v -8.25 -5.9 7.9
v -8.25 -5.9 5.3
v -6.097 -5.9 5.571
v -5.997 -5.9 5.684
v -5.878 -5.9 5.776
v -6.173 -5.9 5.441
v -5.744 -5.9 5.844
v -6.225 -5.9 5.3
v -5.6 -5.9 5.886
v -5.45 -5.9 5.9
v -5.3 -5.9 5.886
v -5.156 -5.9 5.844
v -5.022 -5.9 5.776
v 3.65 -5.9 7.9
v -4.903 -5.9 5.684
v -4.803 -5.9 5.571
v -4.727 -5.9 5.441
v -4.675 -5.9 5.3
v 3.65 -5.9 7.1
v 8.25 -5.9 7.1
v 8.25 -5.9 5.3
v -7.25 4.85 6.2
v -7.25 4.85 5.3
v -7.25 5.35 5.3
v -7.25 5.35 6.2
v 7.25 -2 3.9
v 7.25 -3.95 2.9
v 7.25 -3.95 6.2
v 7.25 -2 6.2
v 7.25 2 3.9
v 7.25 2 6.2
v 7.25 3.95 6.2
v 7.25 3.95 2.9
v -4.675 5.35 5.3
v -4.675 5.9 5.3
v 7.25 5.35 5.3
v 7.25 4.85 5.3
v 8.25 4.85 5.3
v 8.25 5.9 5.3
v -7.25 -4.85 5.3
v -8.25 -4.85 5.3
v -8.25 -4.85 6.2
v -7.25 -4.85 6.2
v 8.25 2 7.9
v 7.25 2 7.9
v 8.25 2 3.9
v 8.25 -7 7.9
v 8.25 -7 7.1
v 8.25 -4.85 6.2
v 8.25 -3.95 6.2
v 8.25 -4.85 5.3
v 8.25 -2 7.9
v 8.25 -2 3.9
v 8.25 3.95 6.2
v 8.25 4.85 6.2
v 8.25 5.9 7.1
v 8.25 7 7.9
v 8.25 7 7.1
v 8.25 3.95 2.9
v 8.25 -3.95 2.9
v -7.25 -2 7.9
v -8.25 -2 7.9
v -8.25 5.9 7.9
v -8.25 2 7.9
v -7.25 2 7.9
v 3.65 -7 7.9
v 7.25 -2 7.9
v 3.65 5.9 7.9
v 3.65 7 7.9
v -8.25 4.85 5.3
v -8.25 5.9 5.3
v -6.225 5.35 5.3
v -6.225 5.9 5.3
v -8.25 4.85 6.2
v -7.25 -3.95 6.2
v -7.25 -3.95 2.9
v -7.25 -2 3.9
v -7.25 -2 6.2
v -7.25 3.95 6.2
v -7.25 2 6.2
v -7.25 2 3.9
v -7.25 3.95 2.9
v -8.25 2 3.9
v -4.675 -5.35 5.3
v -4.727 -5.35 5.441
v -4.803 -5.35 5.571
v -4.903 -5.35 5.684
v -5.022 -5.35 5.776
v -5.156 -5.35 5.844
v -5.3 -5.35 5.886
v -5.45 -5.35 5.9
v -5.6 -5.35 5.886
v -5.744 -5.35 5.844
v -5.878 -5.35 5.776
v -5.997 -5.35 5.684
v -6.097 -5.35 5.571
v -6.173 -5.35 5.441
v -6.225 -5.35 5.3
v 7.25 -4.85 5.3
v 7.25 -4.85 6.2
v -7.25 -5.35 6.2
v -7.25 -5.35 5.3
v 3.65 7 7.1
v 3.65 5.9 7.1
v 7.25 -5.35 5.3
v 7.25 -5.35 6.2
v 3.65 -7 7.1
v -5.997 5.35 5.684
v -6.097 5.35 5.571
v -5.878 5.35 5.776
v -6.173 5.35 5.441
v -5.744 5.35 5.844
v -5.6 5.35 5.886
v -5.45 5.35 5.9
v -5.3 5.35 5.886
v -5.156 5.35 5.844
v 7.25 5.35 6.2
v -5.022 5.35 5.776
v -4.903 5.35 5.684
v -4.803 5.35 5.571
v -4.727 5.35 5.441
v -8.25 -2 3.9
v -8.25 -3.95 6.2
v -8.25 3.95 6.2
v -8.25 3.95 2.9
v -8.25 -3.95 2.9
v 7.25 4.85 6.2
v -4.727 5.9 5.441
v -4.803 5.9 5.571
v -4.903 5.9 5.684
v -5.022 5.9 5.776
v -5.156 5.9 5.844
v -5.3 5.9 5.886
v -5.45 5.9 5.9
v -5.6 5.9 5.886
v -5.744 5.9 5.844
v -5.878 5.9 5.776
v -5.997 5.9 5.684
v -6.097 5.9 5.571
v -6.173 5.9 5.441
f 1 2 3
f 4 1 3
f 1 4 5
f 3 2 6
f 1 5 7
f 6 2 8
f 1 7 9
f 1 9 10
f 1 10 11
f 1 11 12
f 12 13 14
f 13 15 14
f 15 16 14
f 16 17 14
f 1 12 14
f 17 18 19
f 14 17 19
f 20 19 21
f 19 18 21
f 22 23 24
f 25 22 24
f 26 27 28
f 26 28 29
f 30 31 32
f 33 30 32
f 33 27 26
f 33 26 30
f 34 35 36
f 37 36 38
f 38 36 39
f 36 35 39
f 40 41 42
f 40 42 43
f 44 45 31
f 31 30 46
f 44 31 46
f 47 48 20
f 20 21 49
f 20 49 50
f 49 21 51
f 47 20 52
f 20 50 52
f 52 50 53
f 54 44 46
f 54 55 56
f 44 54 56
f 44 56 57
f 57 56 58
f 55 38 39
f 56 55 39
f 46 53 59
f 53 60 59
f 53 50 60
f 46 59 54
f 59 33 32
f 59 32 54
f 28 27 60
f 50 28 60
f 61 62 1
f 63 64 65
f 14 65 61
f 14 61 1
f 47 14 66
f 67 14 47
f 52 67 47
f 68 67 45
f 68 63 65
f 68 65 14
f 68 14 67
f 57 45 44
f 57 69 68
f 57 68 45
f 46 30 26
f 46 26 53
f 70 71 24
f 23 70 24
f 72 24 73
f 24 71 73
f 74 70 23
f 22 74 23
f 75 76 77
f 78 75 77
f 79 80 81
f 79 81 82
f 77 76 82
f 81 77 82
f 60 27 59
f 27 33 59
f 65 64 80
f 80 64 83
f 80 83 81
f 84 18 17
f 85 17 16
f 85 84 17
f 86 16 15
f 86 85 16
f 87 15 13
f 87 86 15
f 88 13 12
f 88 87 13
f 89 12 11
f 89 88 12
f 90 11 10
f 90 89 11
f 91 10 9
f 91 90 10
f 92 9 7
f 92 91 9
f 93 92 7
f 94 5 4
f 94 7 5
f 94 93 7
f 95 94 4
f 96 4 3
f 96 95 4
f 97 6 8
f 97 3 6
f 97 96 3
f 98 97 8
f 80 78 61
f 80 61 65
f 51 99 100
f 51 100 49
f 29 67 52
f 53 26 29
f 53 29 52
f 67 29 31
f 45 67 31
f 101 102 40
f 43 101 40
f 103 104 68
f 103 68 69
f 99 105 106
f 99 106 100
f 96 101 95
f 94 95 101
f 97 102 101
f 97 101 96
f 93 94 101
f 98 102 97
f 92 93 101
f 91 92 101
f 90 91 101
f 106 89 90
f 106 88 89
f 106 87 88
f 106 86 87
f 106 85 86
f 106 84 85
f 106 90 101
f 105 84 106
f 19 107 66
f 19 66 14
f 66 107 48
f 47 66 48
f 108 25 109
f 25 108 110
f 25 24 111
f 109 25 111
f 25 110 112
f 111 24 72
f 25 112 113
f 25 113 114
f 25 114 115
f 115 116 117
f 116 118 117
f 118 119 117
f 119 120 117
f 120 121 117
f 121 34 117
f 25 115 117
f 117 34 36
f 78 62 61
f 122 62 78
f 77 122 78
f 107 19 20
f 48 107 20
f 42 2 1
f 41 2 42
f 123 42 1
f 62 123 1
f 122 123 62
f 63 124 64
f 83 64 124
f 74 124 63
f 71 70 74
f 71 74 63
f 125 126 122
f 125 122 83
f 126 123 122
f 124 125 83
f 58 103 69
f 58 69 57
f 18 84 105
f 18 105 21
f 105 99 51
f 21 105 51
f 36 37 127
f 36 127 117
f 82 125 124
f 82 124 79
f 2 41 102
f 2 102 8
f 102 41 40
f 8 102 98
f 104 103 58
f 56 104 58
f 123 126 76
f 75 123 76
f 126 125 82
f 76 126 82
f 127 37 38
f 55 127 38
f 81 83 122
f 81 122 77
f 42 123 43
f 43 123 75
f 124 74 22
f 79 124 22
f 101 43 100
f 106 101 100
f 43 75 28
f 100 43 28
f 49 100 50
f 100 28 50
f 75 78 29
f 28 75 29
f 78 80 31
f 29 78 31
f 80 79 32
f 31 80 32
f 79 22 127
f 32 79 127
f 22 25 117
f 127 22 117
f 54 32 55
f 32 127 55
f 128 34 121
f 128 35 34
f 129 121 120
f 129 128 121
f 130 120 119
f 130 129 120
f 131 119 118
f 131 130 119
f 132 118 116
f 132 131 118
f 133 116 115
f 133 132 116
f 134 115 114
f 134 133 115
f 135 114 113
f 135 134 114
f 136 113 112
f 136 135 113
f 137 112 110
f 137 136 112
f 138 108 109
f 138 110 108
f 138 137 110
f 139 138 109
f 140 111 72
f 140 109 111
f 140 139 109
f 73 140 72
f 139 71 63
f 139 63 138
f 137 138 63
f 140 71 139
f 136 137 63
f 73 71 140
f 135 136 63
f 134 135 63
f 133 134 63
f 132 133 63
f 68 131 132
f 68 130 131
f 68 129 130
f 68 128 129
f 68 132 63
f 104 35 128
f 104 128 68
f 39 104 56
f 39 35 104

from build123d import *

# Parameters (mm, degrees)
CYLINDER007_R     = 0.8
CYLINDER007_DEPTH = 20
BOX035_W          = 16.5
BOX035_H          = 0.9
BOX035_DEPTH      = 0.9
BOX029_W          = 16.5
BOX029_H          = 0.9
BOX029_DEPTH      = 0.9
BOX032_W          = 16.5
BOX032_H          = 2
BOX032_DEPTH      = 2.4
BOX026_W          = 16.5
BOX026_H          = 2
BOX026_DEPTH      = 2.4
BOX036_W          = 14.5
BOX036_H          = 10.7
BOX036_DEPTH      = 3.3
BOX027_W          = 11.9
BOX027_H          = 1.1
BOX027_DEPTH      = 5
BOX033_W          = 11.9
BOX033_H          = 1.1
BOX033_DEPTH      = 5
BOX028_W          = 4.6
BOX028_H          = 1.1
BOX028_DEPTH      = 4.2
BOX034_W          = 4.6
BOX034_H          = 1.1
BOX034_DEPTH      = 4.2
BOX031_W          = 1
BOX031_H          = 4
BOX031_DEPTH      = 4
BOX030_W          = 1
BOX030_H          = 4
BOX030_DEPTH      = 4
BOX025_W          = 16.5
BOX025_H          = 14
BOX025_DEPTH      = 5


with BuildPart() as cylinder007:
    # Cylinder007 → Cylinder007 (new body)
    with BuildSketch(Plane(origin=(2.8, 10, 2.2), x_dir=(1, 0, 0), z_dir=(0, -1, 0))):
        Circle(CYLINDER007_R)
    extrude(amount=CYLINDER007_DEPTH)


with BuildPart() as cube032:
    # Box035 → Box035 (new body)
    with BuildSketch(Plane(origin=(0, 3.95, 2.4), x_dir=(1, 0, 0), z_dir=(0, 0, 1))):
        with Locations((8.25, 0.45)):
            Rectangle(BOX035_W, BOX035_H)
    extrude(amount=BOX035_DEPTH)


with BuildPart() as compound004:
    # Box029 → Box029 (new body)
    with BuildSketch(Plane(origin=(0, -4.85, 2.4), x_dir=(1, 0, 0), z_dir=(0, 0, 1))):
        with Locations((8.25, 0.45)):
            Rectangle(BOX029_W, BOX029_H)
    extrude(amount=BOX029_DEPTH)

    # Compound004: union Cube032
    add(cube032.part)


with BuildPart() as cube029:
    # Box032 → Box032 (new body)
    with BuildSketch(Plane(origin=(0, -5.95, 0), x_dir=(1, 0, 0), z_dir=(0, 0, 1))):
        with Locations((8.25, 1)):
            Rectangle(BOX032_W, BOX032_H)
    extrude(amount=BOX032_DEPTH)


with BuildPart() as compound005:
    # Box026 → Box026 (new body)
    with BuildSketch(Plane(origin=(0, 3.95, 0), x_dir=(1, 0, 0), z_dir=(0, 0, 1))):
        with Locations((8.25, 1)):
            Rectangle(BOX026_W, BOX026_H)
    extrude(amount=BOX026_DEPTH)

    # Compound005: union Cube029
    add(cube029.part)


with BuildPart() as cube033:
    # Box036 → Box036 (new body)
    with BuildSketch(Plane(origin=(1, -5.35, 0), x_dir=(1, 0, 0), z_dir=(0, 0, 1))):
        with Locations((7.25, 5.35)):
            Rectangle(BOX036_W, BOX036_H)
    extrude(amount=BOX036_DEPTH)


with BuildPart() as cube024:
    # Box027 → Box027 (new body)
    with BuildSketch(Plane(origin=(0, 5.9, 0), x_dir=(1, 0, 0), z_dir=(0, 0, 1))):
        with Locations((5.95, 0.55)):
            Rectangle(BOX027_W, BOX027_H)
    extrude(amount=BOX027_DEPTH)


with BuildPart() as cube030:
    # Box033 → Box033 (new body)
    with BuildSketch(Plane(origin=(0, -7, 0), x_dir=(1, 0, 0), z_dir=(0, 0, 1))):
        with Locations((5.95, 0.55)):
            Rectangle(BOX033_W, BOX033_H)
    extrude(amount=BOX033_DEPTH)


with BuildPart() as cube025:
    # Box028 → Box028 (new body)
    with BuildSketch(Plane(origin=(11.9, -7, 0), x_dir=(1, 0, 0), z_dir=(0, 0, 1))):
        with Locations((2.3, 0.55)):
            Rectangle(BOX028_W, BOX028_H)
    extrude(amount=BOX028_DEPTH)


with BuildPart() as cube031:
    # Box034 → Box034 (new body)
    with BuildSketch(Plane(origin=(11.9, 5.9, 0), x_dir=(1, 0, 0), z_dir=(0, 0, 1))):
        with Locations((2.3, 0.55)):
            Rectangle(BOX034_W, BOX034_H)
    extrude(amount=BOX034_DEPTH)


with BuildPart() as cube028:
    # Box031 → Box031 (new body)
    with BuildSketch(Plane(origin=(0, -2, 1), x_dir=(1, 0, 0), z_dir=(0, 0, 1))):
        with Locations((0.5, 2)):
            Rectangle(BOX031_W, BOX031_H)
    extrude(amount=BOX031_DEPTH)


with BuildPart() as compound003:
    # Box030 → Box030 (new body)
    with BuildSketch(Plane(origin=(15.5, -2, 1), x_dir=(1, 0, 0), z_dir=(0, 0, 1))):
        with Locations((0.5, 2)):
            Rectangle(BOX030_W, BOX030_H)
    extrude(amount=BOX030_DEPTH)

    # Compound003: union Cube028
    add(cube028.part)


with BuildPart() as topcut:
    # Box025 → Box025 (new body)
    with BuildSketch(Plane(origin=(0, -7, 0), x_dir=(1, 0, 0), z_dir=(0, 0, 1))):
        with Locations((8.25, 7)):
            Rectangle(BOX025_W, BOX025_H)
    extrude(amount=BOX025_DEPTH)

    # Cut014: cut Compound003
    add(compound003.part, mode=Mode.SUBTRACT)

    # Cut012: cut Cube031
    add(cube031.part, mode=Mode.SUBTRACT)

    # Cut016: cut Cube025
    add(cube025.part, mode=Mode.SUBTRACT)

    # Cut013: cut Cube030
    add(cube030.part, mode=Mode.SUBTRACT)

    # Cut015: cut Cube024
    add(cube024.part, mode=Mode.SUBTRACT)

    # Cut017: cut Cube033
    add(cube033.part, mode=Mode.SUBTRACT)

    # Cut018: cut Compound005
    add(compound005.part, mode=Mode.SUBTRACT)

    # Cut011: cut Compound004
    add(compound004.part, mode=Mode.SUBTRACT)

    # Cut010: cut Cylinder007
    add(cylinder007.part, mode=Mode.SUBTRACT)


with BuildPart() as topcut_1:
    # Cut010 placement: moved
    add(topcut.part.moved(Location((-8.25, 0, 2.9))))


solid = topcut_1.part
